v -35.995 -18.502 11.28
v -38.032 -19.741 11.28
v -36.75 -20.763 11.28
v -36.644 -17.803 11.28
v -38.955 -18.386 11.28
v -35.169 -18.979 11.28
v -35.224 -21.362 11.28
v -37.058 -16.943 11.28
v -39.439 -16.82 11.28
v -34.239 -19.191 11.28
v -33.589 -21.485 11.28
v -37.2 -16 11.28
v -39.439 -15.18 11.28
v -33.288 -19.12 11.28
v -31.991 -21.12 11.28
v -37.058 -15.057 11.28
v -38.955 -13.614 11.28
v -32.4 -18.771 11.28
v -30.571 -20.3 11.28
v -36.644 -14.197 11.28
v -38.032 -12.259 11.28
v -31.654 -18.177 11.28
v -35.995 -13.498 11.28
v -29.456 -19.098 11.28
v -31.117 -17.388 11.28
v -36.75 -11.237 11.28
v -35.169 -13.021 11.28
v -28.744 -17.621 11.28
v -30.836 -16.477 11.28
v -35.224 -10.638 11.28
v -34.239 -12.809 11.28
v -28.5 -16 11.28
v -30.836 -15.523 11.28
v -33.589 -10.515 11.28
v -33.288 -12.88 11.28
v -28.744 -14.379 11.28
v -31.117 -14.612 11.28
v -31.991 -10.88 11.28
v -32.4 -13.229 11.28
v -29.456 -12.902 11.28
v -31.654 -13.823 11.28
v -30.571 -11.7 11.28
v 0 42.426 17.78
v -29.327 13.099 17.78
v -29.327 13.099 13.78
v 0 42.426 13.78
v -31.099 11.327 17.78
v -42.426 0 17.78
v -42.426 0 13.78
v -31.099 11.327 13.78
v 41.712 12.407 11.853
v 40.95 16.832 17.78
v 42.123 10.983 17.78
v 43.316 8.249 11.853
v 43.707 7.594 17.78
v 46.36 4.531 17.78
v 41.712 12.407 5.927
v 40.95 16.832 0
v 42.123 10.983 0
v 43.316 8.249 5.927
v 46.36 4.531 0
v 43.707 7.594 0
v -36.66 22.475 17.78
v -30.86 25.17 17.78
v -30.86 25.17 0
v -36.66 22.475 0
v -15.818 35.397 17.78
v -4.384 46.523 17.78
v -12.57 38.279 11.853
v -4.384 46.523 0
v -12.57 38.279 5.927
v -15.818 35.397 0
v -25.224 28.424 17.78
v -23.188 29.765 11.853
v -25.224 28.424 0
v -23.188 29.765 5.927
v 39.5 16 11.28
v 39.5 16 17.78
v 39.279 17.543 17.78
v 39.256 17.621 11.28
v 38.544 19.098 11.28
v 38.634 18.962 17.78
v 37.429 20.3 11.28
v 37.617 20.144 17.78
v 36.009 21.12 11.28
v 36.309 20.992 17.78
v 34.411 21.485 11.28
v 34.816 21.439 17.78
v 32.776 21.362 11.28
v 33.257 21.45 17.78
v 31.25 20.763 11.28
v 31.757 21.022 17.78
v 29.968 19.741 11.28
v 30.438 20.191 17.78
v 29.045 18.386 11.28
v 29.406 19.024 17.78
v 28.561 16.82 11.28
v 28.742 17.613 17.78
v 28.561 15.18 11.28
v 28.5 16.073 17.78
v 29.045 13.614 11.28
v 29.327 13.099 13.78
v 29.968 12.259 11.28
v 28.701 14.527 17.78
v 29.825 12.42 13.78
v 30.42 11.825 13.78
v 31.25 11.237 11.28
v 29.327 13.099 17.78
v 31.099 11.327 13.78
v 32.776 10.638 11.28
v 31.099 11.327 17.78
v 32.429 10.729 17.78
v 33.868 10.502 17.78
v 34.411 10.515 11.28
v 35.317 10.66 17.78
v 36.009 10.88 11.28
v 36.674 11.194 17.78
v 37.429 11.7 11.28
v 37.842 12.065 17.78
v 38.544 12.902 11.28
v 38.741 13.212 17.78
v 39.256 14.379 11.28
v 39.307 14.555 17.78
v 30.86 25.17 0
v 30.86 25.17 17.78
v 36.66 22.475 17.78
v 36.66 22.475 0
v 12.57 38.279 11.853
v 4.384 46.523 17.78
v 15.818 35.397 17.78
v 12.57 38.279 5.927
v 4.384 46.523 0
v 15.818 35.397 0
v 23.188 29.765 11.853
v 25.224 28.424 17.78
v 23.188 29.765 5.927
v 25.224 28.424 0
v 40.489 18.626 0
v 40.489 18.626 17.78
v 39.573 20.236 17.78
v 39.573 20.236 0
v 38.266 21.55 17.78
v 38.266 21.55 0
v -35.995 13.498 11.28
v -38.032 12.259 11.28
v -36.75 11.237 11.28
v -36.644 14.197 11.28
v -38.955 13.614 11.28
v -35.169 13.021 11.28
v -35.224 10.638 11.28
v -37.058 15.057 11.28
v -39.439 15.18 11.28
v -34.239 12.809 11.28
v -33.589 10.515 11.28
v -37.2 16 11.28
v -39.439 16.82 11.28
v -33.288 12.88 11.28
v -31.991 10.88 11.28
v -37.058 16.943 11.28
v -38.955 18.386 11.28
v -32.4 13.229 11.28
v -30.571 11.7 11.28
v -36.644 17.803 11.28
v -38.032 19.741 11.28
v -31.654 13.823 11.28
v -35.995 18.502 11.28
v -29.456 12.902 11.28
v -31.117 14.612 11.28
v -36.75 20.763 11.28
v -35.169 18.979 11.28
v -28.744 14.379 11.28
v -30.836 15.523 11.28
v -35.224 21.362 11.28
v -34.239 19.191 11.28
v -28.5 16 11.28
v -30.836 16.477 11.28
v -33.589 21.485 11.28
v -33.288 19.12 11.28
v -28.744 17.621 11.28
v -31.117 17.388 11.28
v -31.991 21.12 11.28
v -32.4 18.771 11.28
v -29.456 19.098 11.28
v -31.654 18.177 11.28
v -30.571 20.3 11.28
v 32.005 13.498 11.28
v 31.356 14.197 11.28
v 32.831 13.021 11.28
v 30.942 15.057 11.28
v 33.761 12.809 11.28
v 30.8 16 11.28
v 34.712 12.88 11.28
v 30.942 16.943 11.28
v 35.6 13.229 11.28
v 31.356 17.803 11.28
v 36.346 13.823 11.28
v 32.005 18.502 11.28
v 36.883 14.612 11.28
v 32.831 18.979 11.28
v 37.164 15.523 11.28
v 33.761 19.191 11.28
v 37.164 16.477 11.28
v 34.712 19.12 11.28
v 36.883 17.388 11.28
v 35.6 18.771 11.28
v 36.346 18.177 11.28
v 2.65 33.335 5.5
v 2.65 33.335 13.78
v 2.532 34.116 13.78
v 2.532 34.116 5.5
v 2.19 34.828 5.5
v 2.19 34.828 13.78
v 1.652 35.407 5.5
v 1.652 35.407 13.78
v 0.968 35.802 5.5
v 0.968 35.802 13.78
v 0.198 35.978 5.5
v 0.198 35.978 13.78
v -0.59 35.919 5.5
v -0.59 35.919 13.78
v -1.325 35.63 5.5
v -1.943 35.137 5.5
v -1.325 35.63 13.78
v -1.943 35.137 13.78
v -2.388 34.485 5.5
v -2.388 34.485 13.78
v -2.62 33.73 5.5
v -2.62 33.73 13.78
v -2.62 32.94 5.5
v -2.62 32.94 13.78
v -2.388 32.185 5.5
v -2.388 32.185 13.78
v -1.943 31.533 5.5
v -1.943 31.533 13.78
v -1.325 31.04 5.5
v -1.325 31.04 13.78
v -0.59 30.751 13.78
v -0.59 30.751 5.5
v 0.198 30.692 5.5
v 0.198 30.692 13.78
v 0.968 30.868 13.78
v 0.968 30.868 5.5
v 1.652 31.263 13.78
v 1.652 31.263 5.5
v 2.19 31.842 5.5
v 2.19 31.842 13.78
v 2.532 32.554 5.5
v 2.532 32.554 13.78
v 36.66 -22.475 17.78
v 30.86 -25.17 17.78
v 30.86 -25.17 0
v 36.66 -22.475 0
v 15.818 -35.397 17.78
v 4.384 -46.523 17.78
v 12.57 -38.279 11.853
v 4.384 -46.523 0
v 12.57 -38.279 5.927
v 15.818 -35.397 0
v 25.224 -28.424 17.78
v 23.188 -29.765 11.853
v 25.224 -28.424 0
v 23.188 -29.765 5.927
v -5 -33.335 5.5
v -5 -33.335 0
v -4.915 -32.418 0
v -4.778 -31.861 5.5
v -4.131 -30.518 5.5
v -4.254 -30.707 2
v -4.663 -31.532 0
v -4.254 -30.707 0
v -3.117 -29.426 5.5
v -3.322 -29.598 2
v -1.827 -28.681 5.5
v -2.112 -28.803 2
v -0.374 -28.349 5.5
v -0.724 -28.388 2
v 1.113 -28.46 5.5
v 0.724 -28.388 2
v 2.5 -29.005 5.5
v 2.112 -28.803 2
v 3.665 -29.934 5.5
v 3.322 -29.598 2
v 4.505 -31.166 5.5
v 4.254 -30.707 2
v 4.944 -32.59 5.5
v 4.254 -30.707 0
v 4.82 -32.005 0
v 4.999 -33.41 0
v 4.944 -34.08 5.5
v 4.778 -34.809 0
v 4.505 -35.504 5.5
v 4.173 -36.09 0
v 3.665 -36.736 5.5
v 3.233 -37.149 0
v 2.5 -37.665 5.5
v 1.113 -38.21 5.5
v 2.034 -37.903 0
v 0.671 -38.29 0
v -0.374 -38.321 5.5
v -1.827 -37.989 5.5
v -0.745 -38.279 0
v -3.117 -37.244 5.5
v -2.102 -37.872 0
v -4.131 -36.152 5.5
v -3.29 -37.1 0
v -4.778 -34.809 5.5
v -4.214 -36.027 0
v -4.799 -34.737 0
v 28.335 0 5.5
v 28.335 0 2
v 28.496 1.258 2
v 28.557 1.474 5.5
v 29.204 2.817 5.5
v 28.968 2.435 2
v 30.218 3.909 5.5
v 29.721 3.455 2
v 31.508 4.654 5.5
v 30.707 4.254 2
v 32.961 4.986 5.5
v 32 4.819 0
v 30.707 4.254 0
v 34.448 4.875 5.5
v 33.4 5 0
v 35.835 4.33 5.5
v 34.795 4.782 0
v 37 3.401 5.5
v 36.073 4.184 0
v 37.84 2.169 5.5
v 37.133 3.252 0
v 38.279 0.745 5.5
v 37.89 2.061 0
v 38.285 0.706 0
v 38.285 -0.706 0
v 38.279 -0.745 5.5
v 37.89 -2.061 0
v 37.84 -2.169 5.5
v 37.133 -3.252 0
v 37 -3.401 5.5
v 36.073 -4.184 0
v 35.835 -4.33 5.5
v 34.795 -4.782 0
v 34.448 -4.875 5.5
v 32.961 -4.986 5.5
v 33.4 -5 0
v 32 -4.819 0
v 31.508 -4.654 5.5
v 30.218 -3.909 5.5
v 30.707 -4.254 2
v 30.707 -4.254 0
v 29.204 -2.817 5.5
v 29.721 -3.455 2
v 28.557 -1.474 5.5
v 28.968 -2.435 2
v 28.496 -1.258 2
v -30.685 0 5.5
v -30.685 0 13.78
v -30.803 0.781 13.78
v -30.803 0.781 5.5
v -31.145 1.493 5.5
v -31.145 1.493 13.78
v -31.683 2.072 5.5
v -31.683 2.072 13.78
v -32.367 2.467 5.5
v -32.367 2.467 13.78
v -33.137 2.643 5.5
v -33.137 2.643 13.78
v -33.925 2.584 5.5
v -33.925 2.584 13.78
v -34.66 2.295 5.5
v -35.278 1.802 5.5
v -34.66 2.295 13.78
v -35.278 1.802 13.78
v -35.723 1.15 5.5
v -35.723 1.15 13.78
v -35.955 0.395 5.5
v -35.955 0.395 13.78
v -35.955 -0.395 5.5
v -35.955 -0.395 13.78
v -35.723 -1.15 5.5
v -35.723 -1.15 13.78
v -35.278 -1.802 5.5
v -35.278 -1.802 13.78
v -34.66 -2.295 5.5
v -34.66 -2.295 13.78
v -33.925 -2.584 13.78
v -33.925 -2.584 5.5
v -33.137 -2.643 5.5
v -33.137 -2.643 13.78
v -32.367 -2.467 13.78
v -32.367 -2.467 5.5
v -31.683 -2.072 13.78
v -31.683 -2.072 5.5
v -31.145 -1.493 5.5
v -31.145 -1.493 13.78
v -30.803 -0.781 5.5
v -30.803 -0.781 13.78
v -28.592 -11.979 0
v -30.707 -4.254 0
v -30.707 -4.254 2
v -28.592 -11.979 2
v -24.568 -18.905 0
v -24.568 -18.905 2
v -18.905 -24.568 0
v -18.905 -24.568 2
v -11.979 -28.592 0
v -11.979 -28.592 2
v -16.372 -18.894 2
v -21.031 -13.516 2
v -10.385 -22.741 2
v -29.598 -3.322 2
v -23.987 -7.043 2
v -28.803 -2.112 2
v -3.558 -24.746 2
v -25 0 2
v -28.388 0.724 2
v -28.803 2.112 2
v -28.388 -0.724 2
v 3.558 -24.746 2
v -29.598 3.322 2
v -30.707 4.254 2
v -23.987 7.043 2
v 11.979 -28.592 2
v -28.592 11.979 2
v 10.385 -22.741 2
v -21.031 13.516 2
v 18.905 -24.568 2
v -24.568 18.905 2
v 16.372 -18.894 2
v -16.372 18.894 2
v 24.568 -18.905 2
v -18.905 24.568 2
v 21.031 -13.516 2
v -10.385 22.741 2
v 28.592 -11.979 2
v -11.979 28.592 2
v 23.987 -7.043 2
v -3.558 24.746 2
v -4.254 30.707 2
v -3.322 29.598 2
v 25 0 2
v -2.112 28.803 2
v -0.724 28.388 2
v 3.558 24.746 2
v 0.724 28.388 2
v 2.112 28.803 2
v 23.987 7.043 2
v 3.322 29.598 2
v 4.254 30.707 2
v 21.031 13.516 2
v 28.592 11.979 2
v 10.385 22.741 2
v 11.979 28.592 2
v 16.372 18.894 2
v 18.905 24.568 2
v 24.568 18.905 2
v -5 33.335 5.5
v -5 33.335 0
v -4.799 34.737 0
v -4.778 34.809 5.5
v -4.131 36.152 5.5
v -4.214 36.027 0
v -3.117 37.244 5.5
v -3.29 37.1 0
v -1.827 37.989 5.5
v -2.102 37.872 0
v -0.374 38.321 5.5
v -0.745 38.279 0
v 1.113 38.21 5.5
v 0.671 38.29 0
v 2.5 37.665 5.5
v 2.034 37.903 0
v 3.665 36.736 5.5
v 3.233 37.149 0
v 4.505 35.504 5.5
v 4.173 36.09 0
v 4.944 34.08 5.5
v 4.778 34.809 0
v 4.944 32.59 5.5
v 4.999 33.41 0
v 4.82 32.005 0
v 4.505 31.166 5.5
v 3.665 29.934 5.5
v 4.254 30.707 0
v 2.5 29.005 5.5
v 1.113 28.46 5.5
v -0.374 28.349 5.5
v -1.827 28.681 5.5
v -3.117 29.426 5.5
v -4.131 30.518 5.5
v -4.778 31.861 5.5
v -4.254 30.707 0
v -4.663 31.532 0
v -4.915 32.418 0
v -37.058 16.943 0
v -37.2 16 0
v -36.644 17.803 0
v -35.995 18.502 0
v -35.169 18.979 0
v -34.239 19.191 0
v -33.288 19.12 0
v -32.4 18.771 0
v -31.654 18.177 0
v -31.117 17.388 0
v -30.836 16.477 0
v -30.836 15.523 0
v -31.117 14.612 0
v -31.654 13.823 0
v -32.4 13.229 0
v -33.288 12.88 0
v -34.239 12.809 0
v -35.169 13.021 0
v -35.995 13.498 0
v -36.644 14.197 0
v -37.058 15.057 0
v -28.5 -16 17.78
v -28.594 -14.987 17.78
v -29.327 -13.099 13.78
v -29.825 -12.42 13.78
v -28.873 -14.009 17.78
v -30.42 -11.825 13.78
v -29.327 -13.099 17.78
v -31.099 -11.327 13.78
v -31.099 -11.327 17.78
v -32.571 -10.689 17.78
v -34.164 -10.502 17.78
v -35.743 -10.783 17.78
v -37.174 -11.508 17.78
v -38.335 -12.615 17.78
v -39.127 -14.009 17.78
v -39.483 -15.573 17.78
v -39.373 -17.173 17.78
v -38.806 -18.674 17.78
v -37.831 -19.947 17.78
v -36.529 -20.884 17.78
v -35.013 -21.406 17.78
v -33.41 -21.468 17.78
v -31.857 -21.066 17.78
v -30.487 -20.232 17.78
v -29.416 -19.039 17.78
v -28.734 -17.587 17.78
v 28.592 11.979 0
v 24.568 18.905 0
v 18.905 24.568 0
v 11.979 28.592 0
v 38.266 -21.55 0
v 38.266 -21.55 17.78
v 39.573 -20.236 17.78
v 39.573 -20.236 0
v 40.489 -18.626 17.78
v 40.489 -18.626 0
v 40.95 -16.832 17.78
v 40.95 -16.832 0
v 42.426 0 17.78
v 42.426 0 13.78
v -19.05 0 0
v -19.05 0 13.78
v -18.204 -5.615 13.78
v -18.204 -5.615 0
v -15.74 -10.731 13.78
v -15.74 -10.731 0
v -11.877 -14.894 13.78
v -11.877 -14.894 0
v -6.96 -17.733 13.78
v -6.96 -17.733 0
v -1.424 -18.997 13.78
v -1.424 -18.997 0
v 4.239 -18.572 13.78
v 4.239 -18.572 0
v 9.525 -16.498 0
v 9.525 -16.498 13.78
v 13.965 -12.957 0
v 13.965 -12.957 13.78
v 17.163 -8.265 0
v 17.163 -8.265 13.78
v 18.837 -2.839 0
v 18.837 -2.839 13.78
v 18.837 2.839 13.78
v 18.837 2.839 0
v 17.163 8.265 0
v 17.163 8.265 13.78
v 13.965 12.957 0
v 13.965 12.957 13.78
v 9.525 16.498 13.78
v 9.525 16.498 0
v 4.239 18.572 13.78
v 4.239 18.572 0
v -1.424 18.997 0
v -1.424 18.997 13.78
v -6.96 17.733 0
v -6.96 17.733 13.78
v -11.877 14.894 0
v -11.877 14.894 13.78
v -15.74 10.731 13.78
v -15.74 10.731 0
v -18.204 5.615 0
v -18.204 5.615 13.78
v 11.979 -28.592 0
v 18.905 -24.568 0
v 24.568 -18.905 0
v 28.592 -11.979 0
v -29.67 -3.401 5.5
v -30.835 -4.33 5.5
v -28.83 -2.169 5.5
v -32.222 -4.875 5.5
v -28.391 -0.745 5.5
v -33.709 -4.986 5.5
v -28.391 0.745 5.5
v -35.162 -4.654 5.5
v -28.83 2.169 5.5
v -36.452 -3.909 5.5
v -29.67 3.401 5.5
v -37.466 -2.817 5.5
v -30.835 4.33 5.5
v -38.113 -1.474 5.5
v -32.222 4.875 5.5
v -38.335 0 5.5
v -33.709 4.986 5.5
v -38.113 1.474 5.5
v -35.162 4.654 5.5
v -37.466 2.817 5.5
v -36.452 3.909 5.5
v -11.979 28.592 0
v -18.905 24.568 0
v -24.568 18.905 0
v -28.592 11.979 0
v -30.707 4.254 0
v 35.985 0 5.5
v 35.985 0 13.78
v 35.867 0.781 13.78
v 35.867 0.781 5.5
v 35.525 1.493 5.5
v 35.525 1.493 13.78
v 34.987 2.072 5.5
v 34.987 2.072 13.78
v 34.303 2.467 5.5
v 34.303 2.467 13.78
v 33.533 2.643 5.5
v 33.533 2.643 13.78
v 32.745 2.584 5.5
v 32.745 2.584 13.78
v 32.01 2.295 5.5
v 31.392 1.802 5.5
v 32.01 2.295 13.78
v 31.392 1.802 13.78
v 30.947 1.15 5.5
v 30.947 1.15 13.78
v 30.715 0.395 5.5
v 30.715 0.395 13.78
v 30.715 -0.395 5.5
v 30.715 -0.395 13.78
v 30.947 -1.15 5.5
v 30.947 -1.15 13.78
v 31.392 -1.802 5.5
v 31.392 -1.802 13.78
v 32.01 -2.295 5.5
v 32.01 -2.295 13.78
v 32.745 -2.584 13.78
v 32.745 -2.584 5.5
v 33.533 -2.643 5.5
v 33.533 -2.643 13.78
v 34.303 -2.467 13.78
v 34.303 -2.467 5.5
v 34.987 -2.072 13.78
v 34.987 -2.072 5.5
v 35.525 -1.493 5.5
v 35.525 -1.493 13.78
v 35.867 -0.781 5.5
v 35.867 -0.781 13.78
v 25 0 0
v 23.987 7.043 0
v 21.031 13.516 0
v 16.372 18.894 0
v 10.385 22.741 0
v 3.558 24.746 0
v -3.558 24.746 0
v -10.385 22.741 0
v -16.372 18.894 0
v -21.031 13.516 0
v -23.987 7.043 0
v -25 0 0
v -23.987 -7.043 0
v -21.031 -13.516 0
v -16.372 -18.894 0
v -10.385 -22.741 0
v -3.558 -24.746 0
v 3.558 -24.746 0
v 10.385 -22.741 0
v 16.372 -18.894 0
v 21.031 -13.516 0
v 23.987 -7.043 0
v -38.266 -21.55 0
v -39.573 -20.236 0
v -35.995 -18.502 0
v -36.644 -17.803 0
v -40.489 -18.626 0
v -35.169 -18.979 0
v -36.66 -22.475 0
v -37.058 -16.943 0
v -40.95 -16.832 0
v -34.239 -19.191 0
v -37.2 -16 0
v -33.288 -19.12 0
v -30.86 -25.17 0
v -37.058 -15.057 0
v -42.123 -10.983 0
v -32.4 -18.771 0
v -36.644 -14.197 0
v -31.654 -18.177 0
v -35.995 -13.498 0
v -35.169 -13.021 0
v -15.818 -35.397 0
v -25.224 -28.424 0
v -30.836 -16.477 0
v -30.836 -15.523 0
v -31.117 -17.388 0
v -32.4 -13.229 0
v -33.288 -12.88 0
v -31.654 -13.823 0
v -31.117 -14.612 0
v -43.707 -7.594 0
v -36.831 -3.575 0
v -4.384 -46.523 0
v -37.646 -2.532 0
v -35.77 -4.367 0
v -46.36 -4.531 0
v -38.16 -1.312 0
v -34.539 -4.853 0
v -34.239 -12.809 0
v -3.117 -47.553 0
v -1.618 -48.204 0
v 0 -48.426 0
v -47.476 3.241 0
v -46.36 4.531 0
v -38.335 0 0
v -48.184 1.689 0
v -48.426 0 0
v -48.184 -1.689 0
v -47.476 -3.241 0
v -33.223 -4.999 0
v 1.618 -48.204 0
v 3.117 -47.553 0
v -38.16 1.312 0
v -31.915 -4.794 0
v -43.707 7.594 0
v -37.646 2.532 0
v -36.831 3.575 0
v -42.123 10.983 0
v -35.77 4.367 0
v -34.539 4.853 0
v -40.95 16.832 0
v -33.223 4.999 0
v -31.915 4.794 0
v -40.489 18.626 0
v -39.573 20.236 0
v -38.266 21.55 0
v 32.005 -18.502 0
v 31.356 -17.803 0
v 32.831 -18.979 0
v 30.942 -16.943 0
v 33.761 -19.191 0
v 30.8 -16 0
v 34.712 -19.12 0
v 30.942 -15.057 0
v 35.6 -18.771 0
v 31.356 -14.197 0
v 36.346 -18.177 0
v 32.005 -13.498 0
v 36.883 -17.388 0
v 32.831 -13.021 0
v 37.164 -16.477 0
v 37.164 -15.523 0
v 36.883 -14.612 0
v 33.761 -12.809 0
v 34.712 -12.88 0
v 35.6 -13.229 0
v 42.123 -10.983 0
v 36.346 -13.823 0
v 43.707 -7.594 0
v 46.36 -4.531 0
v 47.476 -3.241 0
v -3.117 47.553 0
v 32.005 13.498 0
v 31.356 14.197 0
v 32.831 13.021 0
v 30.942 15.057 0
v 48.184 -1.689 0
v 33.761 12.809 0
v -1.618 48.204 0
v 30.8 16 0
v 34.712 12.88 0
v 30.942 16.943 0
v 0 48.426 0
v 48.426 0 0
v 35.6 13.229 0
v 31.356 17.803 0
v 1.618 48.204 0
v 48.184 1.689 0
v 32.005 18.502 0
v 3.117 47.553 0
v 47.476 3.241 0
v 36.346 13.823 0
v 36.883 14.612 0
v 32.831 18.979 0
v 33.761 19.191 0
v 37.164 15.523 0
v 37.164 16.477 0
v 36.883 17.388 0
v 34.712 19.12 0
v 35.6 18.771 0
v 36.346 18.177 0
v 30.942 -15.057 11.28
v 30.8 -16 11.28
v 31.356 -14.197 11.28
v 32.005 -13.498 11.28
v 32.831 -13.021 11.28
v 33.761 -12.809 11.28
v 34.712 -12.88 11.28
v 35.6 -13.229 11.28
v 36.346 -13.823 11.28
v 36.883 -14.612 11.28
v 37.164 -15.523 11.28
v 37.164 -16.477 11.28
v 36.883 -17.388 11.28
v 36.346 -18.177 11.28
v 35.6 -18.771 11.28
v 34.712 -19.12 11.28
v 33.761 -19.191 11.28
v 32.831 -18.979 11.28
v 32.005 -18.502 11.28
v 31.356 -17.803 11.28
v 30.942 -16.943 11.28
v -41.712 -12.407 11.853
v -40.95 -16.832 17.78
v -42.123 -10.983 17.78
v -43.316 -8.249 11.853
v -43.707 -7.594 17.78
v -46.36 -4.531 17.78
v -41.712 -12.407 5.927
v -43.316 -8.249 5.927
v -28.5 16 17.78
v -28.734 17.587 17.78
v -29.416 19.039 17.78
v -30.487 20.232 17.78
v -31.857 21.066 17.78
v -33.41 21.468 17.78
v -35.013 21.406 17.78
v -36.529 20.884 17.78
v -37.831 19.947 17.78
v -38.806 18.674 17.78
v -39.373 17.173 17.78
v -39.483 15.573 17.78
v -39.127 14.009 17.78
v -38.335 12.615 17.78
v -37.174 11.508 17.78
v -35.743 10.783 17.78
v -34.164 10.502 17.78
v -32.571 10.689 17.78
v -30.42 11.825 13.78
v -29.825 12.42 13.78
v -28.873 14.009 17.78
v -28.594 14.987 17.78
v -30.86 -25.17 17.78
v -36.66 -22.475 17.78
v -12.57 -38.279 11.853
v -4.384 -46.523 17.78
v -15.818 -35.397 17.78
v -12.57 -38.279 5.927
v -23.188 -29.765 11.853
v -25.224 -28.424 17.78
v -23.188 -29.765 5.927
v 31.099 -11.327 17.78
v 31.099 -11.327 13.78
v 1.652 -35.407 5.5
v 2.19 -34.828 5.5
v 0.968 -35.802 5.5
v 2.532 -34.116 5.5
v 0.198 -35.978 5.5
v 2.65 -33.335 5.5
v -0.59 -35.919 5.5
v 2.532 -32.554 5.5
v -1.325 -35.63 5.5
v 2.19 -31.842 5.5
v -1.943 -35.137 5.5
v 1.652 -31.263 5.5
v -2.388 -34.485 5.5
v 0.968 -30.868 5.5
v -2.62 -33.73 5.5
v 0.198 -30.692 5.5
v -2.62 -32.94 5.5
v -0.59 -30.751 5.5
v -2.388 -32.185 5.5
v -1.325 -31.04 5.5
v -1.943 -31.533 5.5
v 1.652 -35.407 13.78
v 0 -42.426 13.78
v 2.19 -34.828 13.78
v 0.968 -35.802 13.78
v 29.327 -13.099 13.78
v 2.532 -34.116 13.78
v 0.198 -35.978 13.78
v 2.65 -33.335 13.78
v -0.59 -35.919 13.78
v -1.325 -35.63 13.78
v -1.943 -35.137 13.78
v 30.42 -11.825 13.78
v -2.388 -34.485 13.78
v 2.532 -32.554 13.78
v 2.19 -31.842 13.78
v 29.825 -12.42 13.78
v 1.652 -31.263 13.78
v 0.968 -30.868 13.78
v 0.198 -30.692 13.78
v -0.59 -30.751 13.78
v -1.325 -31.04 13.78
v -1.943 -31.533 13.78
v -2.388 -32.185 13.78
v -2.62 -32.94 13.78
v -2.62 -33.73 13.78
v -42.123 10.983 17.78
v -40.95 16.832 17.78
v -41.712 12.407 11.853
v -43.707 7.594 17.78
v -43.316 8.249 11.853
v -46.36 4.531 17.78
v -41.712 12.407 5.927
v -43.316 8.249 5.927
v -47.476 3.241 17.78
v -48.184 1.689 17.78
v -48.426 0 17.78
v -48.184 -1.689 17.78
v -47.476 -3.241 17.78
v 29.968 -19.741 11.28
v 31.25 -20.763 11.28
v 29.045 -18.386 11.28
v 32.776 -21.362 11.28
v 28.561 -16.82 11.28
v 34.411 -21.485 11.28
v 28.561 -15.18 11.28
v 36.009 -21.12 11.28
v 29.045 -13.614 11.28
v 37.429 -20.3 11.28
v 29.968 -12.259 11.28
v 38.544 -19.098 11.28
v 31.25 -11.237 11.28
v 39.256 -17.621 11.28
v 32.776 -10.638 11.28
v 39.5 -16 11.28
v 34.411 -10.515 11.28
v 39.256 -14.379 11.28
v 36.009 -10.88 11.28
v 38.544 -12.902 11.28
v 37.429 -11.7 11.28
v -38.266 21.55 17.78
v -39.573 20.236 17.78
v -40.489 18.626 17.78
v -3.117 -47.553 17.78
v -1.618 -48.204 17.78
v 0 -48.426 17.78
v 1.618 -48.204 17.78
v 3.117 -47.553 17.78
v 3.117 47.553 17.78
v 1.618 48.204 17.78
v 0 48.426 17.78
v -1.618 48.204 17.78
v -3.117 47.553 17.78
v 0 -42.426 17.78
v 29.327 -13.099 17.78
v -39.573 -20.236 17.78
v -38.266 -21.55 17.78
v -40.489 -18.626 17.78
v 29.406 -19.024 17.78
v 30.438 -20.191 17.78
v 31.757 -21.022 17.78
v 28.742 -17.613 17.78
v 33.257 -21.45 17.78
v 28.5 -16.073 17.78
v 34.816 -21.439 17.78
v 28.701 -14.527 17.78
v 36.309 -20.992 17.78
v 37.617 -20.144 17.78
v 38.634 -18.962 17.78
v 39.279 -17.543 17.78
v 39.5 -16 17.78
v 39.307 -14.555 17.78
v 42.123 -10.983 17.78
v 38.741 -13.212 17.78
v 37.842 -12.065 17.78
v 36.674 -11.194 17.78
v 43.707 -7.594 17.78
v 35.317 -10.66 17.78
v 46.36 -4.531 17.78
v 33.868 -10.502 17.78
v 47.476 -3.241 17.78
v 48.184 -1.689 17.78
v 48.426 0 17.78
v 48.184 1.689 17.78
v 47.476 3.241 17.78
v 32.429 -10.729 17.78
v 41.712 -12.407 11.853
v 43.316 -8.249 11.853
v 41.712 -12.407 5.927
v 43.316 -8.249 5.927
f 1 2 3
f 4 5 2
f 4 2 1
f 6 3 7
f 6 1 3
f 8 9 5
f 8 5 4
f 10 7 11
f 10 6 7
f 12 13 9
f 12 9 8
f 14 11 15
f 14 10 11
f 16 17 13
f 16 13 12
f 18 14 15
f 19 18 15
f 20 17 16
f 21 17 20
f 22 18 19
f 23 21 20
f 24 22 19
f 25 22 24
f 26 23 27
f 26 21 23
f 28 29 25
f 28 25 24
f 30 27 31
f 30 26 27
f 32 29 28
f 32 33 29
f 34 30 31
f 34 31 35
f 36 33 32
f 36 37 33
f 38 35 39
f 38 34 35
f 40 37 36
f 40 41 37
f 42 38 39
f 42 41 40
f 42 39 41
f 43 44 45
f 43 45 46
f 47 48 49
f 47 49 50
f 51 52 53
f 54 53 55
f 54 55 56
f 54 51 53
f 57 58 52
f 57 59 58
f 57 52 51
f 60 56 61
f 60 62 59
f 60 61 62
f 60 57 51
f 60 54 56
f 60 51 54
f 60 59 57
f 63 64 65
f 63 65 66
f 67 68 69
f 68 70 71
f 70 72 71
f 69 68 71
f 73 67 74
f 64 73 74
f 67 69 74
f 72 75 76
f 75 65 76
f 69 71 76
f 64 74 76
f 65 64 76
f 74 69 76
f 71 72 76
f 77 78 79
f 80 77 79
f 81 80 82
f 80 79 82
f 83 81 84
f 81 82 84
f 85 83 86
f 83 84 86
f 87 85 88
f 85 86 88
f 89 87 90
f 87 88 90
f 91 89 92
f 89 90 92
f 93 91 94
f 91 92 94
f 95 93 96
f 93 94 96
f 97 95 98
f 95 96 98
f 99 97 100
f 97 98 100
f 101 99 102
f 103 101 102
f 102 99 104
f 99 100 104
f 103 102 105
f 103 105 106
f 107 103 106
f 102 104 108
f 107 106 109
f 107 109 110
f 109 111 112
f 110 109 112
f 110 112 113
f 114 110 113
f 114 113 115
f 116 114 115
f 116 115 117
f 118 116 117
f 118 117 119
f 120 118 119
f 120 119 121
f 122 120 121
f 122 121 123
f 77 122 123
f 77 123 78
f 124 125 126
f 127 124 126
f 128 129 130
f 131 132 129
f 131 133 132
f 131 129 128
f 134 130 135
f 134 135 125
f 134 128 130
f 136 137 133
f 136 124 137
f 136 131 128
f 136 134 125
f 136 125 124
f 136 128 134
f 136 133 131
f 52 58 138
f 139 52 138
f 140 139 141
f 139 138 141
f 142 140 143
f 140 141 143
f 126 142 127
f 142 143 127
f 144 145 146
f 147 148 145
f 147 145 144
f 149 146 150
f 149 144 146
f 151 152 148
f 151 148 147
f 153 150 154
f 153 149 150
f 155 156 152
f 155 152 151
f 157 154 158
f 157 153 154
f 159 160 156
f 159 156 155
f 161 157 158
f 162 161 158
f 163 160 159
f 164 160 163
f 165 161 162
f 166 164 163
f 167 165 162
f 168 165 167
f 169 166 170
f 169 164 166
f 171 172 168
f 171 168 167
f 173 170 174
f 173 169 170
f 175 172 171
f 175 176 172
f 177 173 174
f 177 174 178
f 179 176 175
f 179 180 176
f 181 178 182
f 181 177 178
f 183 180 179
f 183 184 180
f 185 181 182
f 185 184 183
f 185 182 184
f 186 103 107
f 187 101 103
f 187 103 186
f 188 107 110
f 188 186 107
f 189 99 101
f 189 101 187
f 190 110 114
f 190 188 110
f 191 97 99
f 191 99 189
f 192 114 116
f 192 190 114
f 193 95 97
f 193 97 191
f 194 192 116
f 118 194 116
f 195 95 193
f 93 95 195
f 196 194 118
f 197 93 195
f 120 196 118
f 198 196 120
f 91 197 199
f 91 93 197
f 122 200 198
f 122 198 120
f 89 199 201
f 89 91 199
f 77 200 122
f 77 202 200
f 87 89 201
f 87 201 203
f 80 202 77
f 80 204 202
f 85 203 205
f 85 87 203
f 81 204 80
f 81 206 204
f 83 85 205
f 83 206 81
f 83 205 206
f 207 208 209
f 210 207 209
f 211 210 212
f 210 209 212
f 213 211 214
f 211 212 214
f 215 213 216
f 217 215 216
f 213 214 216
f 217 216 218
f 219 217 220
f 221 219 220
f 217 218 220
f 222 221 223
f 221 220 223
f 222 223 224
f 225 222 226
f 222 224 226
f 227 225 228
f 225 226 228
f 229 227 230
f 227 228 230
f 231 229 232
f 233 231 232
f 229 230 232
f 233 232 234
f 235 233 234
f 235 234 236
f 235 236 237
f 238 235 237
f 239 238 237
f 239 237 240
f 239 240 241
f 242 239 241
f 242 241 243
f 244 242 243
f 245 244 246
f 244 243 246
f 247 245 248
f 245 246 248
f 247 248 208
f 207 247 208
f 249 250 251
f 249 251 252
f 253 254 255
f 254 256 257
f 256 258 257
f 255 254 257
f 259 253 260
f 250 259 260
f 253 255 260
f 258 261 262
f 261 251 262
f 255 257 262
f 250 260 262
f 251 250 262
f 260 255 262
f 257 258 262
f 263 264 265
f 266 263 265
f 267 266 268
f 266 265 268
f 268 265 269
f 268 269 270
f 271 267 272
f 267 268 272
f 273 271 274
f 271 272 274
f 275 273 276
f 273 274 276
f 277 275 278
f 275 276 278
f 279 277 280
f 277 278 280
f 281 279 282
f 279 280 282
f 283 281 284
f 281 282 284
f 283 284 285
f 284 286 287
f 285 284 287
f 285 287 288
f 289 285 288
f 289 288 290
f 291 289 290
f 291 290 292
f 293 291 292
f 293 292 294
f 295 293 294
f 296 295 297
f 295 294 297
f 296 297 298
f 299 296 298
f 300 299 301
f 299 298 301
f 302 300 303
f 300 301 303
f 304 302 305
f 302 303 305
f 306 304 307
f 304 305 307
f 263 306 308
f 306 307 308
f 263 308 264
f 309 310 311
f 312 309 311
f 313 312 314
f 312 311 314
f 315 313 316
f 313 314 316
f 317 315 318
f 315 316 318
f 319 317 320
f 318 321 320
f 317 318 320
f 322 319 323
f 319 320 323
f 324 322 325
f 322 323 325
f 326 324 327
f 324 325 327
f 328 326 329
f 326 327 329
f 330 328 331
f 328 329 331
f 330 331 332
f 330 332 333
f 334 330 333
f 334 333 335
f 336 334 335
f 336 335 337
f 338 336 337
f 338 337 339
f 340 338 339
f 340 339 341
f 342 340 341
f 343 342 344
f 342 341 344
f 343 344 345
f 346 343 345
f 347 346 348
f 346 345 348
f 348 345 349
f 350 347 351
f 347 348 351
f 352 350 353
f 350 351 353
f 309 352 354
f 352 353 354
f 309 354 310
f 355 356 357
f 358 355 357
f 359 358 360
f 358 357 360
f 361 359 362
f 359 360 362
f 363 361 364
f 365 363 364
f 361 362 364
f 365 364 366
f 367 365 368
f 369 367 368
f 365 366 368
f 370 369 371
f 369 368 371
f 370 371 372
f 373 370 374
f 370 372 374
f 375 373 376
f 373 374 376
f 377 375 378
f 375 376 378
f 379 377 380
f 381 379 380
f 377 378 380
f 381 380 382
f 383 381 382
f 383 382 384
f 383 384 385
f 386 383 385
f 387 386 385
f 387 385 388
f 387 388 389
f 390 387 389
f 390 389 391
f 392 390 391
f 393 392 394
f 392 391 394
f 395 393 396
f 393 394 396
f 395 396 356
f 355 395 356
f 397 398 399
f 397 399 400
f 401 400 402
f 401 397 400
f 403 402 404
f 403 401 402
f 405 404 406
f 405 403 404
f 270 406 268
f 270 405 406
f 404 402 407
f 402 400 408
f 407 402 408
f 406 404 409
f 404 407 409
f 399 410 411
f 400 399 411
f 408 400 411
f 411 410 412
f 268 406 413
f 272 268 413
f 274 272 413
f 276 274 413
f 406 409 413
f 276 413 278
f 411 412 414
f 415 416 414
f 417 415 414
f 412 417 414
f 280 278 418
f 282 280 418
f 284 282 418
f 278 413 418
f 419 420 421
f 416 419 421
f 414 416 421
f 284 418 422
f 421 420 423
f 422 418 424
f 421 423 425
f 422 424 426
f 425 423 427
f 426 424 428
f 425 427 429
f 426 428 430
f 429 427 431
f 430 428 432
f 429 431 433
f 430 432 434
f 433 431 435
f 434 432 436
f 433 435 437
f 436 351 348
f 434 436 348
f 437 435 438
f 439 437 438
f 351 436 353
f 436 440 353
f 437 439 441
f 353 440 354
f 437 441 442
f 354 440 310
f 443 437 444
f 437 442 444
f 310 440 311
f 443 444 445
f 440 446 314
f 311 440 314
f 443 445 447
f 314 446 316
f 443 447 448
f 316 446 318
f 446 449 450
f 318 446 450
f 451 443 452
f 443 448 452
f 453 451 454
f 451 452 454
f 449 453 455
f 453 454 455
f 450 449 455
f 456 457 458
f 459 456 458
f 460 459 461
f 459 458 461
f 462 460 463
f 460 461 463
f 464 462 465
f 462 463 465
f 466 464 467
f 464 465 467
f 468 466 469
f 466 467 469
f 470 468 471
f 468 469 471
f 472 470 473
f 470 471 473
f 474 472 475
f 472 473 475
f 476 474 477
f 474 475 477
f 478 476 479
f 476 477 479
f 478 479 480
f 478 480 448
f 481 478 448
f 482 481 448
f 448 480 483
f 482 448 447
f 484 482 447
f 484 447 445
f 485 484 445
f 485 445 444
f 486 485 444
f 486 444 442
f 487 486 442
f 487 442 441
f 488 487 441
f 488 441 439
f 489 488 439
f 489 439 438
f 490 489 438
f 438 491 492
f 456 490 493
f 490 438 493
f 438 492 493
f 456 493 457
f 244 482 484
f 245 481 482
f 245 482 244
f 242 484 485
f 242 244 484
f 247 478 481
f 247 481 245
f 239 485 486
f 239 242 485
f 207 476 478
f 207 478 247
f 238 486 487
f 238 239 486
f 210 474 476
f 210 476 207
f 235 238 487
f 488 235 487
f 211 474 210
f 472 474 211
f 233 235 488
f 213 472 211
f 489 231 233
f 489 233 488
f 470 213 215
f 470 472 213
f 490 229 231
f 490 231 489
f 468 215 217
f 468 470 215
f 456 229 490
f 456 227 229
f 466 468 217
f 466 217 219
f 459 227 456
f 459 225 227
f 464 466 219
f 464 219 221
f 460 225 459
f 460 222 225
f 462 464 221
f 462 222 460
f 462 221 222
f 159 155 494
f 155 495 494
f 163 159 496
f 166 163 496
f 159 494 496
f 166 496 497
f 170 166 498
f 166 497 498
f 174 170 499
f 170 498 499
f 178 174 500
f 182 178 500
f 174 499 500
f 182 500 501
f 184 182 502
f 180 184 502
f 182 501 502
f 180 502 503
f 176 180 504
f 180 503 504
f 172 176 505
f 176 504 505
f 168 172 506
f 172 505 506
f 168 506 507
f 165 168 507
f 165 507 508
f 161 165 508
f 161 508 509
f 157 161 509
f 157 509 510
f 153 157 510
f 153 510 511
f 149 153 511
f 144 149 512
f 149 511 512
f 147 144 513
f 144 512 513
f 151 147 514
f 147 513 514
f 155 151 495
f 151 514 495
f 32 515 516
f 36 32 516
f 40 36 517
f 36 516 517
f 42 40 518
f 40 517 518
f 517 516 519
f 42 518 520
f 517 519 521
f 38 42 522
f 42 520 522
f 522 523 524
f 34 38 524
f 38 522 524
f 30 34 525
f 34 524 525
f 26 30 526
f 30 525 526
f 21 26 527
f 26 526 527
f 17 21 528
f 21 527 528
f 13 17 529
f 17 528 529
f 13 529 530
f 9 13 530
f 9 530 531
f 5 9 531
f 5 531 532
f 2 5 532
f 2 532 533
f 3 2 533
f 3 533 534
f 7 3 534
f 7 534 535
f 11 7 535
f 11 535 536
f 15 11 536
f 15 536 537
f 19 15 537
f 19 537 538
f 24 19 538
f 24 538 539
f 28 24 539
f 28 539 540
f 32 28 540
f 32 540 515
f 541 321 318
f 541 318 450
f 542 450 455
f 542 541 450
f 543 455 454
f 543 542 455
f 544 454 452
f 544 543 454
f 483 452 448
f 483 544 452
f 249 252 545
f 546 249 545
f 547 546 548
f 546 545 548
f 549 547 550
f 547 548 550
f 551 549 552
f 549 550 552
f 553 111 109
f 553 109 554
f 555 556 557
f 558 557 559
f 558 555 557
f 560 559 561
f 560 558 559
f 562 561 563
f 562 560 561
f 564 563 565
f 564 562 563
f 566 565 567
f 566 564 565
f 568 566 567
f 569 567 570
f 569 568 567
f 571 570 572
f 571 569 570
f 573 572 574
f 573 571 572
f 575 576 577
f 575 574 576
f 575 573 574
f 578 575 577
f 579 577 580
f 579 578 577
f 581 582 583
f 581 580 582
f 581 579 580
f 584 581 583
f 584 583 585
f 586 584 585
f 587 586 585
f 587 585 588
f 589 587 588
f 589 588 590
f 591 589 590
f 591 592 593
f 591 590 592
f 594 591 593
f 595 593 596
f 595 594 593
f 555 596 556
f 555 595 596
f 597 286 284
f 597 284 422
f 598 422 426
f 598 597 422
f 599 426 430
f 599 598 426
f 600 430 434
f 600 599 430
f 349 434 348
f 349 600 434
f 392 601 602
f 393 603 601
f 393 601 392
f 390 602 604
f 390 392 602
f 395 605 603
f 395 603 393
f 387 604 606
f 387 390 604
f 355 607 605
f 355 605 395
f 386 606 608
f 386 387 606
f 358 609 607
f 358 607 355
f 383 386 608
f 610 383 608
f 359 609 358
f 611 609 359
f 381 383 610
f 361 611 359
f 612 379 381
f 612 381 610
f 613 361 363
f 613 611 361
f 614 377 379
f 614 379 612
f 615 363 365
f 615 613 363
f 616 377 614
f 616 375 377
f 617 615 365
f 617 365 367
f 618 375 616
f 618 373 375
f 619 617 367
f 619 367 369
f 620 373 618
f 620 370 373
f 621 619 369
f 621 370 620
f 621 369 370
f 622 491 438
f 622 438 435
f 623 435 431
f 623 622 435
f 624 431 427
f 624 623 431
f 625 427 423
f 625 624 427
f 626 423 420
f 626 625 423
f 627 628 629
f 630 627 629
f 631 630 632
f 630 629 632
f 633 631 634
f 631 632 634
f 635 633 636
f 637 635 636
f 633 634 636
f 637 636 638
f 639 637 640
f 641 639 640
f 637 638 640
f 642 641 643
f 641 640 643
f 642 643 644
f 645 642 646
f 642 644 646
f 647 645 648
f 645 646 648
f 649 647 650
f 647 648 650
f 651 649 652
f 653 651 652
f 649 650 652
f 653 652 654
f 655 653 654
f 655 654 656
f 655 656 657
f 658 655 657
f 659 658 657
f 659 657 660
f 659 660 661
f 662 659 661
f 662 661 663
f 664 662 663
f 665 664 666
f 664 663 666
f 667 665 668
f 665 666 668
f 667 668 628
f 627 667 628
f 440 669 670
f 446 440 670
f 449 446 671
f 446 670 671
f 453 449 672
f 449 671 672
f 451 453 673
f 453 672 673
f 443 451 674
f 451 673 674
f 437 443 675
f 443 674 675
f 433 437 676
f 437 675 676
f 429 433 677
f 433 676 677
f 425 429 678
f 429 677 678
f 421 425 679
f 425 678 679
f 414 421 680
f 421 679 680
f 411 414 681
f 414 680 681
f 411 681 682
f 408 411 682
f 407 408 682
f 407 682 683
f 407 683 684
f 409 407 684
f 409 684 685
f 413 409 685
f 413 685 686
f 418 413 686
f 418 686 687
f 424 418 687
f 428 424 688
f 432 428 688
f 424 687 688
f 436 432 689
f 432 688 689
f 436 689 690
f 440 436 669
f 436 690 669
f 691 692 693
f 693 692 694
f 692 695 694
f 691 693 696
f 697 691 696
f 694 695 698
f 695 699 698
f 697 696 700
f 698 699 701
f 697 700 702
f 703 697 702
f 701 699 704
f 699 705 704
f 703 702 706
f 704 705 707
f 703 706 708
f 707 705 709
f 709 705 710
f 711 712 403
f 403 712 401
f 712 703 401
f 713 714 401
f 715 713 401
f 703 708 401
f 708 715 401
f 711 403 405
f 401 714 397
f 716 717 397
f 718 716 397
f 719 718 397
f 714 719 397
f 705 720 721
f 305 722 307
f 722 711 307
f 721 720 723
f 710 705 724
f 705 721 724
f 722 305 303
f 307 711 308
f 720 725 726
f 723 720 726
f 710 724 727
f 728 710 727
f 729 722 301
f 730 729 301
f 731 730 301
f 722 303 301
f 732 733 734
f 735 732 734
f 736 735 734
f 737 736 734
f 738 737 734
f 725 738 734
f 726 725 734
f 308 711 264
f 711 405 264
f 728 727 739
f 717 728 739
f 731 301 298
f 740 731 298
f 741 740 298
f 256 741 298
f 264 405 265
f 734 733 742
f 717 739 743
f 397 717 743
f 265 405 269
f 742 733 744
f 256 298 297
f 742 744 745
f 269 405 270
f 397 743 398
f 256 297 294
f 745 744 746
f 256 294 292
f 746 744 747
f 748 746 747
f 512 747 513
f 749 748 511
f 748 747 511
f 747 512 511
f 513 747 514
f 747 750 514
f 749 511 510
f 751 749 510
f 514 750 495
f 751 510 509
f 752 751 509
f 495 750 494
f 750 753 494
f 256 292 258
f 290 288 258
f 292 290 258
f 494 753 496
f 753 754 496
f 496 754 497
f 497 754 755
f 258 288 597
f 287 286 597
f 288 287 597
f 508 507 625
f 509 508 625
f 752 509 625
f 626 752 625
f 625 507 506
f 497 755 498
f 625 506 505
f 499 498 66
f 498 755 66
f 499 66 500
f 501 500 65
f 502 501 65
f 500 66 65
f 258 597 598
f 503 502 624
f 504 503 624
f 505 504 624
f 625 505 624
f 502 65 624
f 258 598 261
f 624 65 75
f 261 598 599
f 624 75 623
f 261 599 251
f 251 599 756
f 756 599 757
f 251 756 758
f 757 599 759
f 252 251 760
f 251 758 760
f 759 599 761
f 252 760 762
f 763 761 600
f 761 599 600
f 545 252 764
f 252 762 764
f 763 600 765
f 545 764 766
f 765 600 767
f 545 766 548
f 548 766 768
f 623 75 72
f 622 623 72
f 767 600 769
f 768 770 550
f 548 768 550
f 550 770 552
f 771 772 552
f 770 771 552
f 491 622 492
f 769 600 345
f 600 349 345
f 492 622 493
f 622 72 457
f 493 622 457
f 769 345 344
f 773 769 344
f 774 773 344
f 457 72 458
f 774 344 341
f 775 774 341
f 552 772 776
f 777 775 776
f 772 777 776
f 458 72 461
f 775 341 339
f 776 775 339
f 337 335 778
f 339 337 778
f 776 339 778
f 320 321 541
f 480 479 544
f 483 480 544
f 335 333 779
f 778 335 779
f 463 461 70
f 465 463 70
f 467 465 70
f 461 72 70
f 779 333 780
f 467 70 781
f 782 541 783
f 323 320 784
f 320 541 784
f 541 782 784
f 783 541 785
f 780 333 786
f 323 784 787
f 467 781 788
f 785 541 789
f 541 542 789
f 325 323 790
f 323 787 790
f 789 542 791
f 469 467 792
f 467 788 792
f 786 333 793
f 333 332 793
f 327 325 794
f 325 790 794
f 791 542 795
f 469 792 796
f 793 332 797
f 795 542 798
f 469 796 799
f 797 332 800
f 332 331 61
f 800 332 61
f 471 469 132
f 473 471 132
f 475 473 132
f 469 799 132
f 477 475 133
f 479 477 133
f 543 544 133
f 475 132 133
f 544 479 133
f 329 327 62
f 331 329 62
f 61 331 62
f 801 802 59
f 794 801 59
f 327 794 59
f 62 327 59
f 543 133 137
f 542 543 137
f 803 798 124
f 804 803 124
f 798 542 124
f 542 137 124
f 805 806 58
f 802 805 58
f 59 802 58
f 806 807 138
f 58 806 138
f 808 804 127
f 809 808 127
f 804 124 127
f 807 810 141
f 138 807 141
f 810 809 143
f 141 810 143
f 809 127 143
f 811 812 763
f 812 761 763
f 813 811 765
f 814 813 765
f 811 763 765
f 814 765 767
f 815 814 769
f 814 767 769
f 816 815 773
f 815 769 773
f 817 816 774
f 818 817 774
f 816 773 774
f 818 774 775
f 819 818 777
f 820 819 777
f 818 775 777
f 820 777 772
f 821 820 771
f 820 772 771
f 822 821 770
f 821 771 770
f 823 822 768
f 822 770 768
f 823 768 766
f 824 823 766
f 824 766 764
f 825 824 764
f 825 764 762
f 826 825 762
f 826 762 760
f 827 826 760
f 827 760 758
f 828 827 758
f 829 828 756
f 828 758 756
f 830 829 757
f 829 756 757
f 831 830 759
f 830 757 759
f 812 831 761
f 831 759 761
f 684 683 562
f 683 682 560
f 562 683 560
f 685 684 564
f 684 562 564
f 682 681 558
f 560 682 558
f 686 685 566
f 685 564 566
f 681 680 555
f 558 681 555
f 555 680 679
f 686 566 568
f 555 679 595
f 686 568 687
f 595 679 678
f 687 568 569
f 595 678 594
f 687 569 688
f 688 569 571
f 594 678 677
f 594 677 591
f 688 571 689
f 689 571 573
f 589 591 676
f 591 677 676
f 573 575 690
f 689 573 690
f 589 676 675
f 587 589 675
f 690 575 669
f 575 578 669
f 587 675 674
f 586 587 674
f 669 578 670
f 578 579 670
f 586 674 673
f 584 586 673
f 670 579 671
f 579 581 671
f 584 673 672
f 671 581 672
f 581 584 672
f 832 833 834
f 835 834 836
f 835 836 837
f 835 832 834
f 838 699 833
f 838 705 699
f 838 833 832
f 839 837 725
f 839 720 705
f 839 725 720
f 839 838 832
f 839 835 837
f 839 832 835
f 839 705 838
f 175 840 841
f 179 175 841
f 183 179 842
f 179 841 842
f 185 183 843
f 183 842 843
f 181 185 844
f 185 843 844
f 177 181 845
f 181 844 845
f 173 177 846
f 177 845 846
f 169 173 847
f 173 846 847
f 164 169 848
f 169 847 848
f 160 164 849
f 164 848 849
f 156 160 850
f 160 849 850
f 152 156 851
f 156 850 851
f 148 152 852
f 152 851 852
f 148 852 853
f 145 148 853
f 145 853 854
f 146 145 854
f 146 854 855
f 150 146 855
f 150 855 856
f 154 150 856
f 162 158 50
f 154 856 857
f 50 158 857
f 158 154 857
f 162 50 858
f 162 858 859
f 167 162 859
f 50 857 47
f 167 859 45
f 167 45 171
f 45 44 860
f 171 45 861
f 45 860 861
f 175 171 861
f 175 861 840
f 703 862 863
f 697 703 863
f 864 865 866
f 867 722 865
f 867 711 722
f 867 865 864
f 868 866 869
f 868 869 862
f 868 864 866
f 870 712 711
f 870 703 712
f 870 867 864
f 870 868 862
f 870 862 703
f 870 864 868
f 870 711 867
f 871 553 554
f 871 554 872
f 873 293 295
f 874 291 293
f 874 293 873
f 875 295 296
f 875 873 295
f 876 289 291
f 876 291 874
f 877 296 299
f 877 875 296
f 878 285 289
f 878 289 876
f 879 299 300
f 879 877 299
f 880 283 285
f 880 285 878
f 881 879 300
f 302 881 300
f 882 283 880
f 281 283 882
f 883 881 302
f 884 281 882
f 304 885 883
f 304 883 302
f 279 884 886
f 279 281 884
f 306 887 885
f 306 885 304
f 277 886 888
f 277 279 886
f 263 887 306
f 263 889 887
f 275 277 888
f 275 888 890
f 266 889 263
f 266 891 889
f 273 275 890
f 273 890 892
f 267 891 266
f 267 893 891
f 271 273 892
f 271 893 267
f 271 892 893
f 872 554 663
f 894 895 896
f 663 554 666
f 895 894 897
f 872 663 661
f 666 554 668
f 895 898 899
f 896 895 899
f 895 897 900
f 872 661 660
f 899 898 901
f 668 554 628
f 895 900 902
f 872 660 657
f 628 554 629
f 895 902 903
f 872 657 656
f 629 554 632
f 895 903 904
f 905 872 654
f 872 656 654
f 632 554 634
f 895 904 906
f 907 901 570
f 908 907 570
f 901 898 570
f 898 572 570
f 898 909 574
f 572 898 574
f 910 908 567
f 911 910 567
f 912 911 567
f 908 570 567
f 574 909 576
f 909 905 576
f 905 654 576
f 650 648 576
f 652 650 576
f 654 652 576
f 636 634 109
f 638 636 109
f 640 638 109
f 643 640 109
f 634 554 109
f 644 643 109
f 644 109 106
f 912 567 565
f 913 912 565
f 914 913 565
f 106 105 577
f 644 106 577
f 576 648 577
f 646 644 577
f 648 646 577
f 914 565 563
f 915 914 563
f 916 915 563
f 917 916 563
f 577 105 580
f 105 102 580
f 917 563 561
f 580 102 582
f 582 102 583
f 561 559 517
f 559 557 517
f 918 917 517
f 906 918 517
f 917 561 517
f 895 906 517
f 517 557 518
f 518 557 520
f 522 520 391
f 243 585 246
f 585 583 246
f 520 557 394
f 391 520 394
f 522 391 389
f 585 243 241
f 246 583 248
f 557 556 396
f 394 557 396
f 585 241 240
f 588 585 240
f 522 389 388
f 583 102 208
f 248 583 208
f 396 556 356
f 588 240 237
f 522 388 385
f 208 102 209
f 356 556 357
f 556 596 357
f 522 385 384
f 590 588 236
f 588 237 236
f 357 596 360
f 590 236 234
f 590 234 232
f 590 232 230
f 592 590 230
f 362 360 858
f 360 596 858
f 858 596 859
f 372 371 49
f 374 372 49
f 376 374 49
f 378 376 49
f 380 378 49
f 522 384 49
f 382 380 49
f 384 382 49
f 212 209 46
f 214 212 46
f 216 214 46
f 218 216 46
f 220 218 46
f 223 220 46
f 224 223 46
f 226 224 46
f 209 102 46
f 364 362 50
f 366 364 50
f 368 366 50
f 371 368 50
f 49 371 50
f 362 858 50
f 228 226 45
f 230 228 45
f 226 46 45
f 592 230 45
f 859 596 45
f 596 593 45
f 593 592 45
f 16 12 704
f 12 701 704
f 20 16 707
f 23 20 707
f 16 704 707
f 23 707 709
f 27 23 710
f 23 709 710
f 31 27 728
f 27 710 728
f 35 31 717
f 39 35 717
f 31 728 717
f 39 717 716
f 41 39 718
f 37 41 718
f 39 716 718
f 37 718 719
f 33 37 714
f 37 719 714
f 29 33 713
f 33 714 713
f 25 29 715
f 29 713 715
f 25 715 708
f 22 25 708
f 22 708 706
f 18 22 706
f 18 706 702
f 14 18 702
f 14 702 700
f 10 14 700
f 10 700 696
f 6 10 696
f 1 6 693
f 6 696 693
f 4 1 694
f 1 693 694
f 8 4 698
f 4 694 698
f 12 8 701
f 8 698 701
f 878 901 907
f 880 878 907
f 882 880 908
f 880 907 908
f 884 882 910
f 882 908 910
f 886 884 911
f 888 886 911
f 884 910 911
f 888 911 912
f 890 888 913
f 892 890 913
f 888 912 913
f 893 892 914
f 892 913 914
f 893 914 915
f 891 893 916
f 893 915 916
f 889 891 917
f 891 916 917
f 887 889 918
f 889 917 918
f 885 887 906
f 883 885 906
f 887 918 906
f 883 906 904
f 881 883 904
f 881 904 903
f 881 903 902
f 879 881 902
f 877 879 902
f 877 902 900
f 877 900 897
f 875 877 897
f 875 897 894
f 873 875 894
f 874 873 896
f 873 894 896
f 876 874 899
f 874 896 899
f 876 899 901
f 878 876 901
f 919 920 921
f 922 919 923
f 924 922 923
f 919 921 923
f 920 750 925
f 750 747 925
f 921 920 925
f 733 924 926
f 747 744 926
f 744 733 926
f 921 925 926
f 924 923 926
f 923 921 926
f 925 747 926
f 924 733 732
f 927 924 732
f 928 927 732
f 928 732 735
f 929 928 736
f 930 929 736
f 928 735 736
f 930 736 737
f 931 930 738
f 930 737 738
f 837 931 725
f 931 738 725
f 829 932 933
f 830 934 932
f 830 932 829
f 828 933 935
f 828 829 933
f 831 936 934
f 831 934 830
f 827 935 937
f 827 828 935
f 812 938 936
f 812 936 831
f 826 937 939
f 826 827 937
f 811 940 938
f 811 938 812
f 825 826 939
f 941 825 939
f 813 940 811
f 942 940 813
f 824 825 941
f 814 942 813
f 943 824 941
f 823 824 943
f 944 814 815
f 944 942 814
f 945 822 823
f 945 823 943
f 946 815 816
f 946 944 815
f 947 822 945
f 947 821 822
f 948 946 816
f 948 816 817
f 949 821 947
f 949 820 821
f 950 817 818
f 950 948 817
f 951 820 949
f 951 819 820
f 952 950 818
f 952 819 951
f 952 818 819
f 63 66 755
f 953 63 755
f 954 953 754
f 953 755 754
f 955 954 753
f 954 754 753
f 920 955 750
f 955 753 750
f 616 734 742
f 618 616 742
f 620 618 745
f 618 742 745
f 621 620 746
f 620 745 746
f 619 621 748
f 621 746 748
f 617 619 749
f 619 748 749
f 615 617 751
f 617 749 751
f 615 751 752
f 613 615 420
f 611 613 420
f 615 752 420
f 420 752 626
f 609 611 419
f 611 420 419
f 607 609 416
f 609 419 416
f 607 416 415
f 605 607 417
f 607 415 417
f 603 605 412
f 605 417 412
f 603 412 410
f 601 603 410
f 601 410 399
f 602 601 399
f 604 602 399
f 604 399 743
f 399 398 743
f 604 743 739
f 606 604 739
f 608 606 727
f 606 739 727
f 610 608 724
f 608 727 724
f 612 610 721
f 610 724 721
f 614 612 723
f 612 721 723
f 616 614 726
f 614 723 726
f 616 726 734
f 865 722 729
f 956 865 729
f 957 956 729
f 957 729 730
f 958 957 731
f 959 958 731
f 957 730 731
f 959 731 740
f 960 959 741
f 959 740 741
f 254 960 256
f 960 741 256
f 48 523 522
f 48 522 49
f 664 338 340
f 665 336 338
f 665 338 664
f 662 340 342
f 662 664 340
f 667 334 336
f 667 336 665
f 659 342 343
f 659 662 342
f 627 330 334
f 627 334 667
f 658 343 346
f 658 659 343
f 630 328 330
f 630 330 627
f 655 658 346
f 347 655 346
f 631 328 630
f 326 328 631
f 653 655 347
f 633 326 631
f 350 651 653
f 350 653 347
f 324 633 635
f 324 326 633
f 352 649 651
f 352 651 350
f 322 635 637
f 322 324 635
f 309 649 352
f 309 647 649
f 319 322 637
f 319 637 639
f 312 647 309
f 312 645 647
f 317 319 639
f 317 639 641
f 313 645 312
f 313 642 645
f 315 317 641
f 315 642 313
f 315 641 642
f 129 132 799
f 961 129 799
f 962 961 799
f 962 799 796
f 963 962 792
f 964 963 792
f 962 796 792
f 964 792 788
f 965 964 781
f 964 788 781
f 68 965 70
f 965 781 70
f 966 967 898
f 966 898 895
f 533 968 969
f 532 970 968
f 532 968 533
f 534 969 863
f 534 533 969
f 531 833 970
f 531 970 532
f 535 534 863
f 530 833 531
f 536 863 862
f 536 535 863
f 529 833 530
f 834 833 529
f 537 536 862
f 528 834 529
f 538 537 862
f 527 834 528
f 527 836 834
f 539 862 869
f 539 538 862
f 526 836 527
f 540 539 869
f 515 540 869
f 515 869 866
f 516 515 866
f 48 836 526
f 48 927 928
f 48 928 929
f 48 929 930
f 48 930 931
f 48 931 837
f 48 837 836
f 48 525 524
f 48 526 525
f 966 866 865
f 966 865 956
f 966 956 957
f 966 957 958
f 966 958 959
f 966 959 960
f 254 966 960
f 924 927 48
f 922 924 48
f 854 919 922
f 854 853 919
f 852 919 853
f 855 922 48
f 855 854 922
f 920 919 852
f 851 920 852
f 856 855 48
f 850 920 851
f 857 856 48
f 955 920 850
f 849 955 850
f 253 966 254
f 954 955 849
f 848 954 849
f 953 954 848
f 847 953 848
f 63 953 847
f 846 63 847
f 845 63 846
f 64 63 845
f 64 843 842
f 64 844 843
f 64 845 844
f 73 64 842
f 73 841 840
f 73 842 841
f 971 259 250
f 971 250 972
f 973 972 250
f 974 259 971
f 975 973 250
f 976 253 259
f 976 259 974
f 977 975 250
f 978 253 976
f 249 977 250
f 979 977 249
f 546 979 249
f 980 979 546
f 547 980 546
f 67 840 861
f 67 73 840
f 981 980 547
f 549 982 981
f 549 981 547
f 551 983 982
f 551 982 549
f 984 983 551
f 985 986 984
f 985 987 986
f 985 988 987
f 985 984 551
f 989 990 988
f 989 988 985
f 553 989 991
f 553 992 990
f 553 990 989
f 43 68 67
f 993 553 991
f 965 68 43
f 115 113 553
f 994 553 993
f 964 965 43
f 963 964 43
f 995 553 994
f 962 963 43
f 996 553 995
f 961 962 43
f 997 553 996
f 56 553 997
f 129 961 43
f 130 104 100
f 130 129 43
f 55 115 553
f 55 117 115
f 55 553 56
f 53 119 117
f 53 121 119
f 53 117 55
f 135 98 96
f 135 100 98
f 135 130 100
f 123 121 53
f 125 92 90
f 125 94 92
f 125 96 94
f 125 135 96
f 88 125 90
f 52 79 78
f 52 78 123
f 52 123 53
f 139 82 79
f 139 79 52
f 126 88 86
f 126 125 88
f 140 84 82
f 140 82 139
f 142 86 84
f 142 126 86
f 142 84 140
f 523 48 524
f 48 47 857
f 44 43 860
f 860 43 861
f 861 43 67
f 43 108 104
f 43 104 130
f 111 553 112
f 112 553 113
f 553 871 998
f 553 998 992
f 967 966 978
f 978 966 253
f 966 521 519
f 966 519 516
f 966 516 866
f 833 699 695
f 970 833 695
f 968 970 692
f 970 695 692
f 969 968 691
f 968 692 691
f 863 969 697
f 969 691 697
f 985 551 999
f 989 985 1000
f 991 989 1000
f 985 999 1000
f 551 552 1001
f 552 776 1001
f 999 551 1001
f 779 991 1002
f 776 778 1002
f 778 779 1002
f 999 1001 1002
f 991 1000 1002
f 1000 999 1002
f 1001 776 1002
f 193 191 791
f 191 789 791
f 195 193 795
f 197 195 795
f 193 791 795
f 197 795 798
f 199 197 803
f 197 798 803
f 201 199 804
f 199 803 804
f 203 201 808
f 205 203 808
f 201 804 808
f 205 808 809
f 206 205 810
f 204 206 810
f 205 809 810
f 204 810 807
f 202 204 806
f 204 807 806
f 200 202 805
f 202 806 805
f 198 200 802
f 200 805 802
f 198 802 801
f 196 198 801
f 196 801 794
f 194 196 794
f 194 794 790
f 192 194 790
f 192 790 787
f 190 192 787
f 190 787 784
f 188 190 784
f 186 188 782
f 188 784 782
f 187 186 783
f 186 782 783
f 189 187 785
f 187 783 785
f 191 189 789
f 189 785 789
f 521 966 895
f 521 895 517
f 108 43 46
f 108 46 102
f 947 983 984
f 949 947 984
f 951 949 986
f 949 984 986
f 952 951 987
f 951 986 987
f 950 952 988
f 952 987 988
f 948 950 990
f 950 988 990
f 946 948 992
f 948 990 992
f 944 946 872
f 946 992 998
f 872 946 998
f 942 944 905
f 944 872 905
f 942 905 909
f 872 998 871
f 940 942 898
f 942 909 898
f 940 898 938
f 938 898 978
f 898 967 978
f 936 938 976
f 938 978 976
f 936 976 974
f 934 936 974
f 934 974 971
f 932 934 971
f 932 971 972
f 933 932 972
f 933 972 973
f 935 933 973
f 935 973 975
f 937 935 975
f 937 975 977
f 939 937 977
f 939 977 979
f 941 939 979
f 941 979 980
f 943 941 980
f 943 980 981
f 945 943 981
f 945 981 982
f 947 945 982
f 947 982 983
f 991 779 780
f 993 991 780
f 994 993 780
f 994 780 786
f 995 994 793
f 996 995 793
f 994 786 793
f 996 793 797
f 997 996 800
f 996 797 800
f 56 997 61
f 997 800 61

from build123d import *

# Parameters (mm, degrees)
MAIN_FEATURES_SKETCH_R         = 19.05
MAIN_BODY_DEPTH                = 17.78
SKETCH1_8_R                    = 31
SKETCH1_8_R_2                  = 25
RING_POCKET_DEPTH              = 2
CBORE_FOR_M6_SHCS1_D           = 6.4
CBORE_FOR_M6_SHCS1_CBORE_D     = 11
CBORE_FOR_M6_SHCS1_CBORE_DEPTH = 6.5
CBORE_FOR_M5_SHCS1_D           = 5.3
CBORE_FOR_M5_SHCS1_CBORE_D     = 10
CBORE_FOR_M5_SHCS1_CBORE_DEPTH = 5.5
CUT_EXTRUDE5_START             = 17.78
CUT_EXTRUDE5_DEPTH             = 4


with BuildPart() as part:
    # main_features_sketch → main_body (new body)
    with BuildSketch(Plane.XY):
        with BuildLine():
            add(Edge.make_bspline(
                [(4.384277331, -46.522516279), (11.494410565, -38.912173671), (21.620981626, -28.654243233), (36.660389066, -22.474745556)],
                knots=[0, 0, 0, 0, 1, 1, 1, 1], degree=3))
            ThreePointArc((36.660389066, -22.474745556), (39.572504615, -20.236412671), (40.950412855, -16.831721795))
            add(Edge.make_bspline(
                [(40.950412855, -16.831721795), (41.488925466, -12.331557199), (42.397215407, -7.970955774), (46.359831988, -4.530802009)],
                knots=[0, 0, 0, 0, 1, 1, 1, 1], degree=3))
            ThreePointArc((46.359831988, -4.530802009), (48.426406871, 0), (46.359831988, 4.530802009))
            add(Edge.make_bspline(
                [(40.950412855, 16.831721795), (41.488925466, 12.331557199), (42.397215407, 7.970955774), (46.359831988, 4.530802009)],
                knots=[0, 0, 0, 0, 1, 1, 1, 1], degree=3))
            ThreePointArc((40.950412855, 16.831721795), (39.572504615, 20.236412671), (36.660389066, 22.474745556))
            add(Edge.make_bspline(
                [(4.384277331, 46.522516279), (11.494410565, 38.912173671), (21.620981626, 28.654243233), (36.660389066, 22.474745556)],
                knots=[0, 0, 0, 0, 1, 1, 1, 1], degree=3))
            ThreePointArc((4.384277331, 46.522516279), (0, 48.426406871), (-4.384277331, 46.522516279))
            add(Edge.make_bspline(
                [(-4.384277331, 46.522516279), (-11.494410565, 38.912173671), (-21.620981626, 28.654243233), (-36.660389066, 22.474745556)],
                knots=[0, 0, 0, 0, 1, 1, 1, 1], degree=3))
            ThreePointArc((-36.660389066, 22.474745556), (-39.572504615, 20.236412671), (-40.950412855, 16.831721795))
            add(Edge.make_bspline(
                [(-40.950412855, 16.831721795), (-41.488925466, 12.331557199), (-42.397215407, 7.970955774), (-46.359831988, 4.530802009)],
                knots=[0, 0, 0, 0, 1, 1, 1, 1], degree=3))
            ThreePointArc((-46.359831988, 4.530802009), (-48.426406871, 0), (-46.359831988, -4.530802009))
            add(Edge.make_bspline(
                [(-40.950412855, -16.831721795), (-41.488925466, -12.331557199), (-42.397215407, -7.970955774), (-46.359831988, -4.530802009)],
                knots=[0, 0, 0, 0, 1, 1, 1, 1], degree=3))
            ThreePointArc((-40.950412855, -16.831721795), (-39.572504615, -20.236412671), (-36.660389066, -22.474745556))
            add(Edge.make_bspline(
                [(-4.384277331, -46.522516279), (-11.494410565, -38.912173671), (-21.620981626, -28.654243233), (-36.660389066, -22.474745556)],
                knots=[0, 0, 0, 0, 1, 1, 1, 1], degree=3))
            ThreePointArc((-4.384277331, -46.522516279), (0, -48.426406871), (4.384277331, -46.522516279))
        make_face()
        with Locations(Location((0, 0, 0), (0, 0, 180))):
            Circle(MAIN_FEATURES_SKETCH_R, mode=Mode.SUBTRACT)
    extrude(amount=MAIN_BODY_DEPTH)

    # Sketch1<8> → ring_pocket (cut)
    with BuildSketch(Plane.XY):
        Circle(SKETCH1_8_R)
        Circle(SKETCH1_8_R_2, mode=Mode.SUBTRACT)
    extrude(amount=RING_POCKET_DEPTH, mode=Mode.SUBTRACT)

    # CBORE for M6 SHCS1 (through all)
    with Locations(Plane.XY.offset(17.78)):
        with Locations((-34, 16), (-34, -16), (34, -16), (34, 16)):
            CounterBoreHole(CBORE_FOR_M6_SHCS1_D / 2, CBORE_FOR_M6_SHCS1_CBORE_D / 2, CBORE_FOR_M6_SHCS1_CBORE_DEPTH)

    # CBORE for M5 SHCS1 (through all)
    with Locations(Plane(origin=(0, 0, 0), x_dir=(-1, 0, 0), z_dir=(0, 0, -1))):
        with Locations((0, 33.335), (33.335, 0), (0, -33.335), (-33.335, 0)):
            CounterBoreHole(CBORE_FOR_M5_SHCS1_D / 2, CBORE_FOR_M5_SHCS1_CBORE_D / 2, CBORE_FOR_M5_SHCS1_CBORE_DEPTH)

    # main_features_sketch<9> → Cut-Extrude5 (cut)
    with BuildSketch(Plane.XY.offset(CUT_EXTRUDE5_START)):
        Polygon((0, 42.426406871), (42.426406871, 0), (0, -42.426406871), (-42.426406871, 0), align=None)
    extrude(amount=-CUT_EXTRUDE5_DEPTH, mode=Mode.SUBTRACT)


solid = part.part
